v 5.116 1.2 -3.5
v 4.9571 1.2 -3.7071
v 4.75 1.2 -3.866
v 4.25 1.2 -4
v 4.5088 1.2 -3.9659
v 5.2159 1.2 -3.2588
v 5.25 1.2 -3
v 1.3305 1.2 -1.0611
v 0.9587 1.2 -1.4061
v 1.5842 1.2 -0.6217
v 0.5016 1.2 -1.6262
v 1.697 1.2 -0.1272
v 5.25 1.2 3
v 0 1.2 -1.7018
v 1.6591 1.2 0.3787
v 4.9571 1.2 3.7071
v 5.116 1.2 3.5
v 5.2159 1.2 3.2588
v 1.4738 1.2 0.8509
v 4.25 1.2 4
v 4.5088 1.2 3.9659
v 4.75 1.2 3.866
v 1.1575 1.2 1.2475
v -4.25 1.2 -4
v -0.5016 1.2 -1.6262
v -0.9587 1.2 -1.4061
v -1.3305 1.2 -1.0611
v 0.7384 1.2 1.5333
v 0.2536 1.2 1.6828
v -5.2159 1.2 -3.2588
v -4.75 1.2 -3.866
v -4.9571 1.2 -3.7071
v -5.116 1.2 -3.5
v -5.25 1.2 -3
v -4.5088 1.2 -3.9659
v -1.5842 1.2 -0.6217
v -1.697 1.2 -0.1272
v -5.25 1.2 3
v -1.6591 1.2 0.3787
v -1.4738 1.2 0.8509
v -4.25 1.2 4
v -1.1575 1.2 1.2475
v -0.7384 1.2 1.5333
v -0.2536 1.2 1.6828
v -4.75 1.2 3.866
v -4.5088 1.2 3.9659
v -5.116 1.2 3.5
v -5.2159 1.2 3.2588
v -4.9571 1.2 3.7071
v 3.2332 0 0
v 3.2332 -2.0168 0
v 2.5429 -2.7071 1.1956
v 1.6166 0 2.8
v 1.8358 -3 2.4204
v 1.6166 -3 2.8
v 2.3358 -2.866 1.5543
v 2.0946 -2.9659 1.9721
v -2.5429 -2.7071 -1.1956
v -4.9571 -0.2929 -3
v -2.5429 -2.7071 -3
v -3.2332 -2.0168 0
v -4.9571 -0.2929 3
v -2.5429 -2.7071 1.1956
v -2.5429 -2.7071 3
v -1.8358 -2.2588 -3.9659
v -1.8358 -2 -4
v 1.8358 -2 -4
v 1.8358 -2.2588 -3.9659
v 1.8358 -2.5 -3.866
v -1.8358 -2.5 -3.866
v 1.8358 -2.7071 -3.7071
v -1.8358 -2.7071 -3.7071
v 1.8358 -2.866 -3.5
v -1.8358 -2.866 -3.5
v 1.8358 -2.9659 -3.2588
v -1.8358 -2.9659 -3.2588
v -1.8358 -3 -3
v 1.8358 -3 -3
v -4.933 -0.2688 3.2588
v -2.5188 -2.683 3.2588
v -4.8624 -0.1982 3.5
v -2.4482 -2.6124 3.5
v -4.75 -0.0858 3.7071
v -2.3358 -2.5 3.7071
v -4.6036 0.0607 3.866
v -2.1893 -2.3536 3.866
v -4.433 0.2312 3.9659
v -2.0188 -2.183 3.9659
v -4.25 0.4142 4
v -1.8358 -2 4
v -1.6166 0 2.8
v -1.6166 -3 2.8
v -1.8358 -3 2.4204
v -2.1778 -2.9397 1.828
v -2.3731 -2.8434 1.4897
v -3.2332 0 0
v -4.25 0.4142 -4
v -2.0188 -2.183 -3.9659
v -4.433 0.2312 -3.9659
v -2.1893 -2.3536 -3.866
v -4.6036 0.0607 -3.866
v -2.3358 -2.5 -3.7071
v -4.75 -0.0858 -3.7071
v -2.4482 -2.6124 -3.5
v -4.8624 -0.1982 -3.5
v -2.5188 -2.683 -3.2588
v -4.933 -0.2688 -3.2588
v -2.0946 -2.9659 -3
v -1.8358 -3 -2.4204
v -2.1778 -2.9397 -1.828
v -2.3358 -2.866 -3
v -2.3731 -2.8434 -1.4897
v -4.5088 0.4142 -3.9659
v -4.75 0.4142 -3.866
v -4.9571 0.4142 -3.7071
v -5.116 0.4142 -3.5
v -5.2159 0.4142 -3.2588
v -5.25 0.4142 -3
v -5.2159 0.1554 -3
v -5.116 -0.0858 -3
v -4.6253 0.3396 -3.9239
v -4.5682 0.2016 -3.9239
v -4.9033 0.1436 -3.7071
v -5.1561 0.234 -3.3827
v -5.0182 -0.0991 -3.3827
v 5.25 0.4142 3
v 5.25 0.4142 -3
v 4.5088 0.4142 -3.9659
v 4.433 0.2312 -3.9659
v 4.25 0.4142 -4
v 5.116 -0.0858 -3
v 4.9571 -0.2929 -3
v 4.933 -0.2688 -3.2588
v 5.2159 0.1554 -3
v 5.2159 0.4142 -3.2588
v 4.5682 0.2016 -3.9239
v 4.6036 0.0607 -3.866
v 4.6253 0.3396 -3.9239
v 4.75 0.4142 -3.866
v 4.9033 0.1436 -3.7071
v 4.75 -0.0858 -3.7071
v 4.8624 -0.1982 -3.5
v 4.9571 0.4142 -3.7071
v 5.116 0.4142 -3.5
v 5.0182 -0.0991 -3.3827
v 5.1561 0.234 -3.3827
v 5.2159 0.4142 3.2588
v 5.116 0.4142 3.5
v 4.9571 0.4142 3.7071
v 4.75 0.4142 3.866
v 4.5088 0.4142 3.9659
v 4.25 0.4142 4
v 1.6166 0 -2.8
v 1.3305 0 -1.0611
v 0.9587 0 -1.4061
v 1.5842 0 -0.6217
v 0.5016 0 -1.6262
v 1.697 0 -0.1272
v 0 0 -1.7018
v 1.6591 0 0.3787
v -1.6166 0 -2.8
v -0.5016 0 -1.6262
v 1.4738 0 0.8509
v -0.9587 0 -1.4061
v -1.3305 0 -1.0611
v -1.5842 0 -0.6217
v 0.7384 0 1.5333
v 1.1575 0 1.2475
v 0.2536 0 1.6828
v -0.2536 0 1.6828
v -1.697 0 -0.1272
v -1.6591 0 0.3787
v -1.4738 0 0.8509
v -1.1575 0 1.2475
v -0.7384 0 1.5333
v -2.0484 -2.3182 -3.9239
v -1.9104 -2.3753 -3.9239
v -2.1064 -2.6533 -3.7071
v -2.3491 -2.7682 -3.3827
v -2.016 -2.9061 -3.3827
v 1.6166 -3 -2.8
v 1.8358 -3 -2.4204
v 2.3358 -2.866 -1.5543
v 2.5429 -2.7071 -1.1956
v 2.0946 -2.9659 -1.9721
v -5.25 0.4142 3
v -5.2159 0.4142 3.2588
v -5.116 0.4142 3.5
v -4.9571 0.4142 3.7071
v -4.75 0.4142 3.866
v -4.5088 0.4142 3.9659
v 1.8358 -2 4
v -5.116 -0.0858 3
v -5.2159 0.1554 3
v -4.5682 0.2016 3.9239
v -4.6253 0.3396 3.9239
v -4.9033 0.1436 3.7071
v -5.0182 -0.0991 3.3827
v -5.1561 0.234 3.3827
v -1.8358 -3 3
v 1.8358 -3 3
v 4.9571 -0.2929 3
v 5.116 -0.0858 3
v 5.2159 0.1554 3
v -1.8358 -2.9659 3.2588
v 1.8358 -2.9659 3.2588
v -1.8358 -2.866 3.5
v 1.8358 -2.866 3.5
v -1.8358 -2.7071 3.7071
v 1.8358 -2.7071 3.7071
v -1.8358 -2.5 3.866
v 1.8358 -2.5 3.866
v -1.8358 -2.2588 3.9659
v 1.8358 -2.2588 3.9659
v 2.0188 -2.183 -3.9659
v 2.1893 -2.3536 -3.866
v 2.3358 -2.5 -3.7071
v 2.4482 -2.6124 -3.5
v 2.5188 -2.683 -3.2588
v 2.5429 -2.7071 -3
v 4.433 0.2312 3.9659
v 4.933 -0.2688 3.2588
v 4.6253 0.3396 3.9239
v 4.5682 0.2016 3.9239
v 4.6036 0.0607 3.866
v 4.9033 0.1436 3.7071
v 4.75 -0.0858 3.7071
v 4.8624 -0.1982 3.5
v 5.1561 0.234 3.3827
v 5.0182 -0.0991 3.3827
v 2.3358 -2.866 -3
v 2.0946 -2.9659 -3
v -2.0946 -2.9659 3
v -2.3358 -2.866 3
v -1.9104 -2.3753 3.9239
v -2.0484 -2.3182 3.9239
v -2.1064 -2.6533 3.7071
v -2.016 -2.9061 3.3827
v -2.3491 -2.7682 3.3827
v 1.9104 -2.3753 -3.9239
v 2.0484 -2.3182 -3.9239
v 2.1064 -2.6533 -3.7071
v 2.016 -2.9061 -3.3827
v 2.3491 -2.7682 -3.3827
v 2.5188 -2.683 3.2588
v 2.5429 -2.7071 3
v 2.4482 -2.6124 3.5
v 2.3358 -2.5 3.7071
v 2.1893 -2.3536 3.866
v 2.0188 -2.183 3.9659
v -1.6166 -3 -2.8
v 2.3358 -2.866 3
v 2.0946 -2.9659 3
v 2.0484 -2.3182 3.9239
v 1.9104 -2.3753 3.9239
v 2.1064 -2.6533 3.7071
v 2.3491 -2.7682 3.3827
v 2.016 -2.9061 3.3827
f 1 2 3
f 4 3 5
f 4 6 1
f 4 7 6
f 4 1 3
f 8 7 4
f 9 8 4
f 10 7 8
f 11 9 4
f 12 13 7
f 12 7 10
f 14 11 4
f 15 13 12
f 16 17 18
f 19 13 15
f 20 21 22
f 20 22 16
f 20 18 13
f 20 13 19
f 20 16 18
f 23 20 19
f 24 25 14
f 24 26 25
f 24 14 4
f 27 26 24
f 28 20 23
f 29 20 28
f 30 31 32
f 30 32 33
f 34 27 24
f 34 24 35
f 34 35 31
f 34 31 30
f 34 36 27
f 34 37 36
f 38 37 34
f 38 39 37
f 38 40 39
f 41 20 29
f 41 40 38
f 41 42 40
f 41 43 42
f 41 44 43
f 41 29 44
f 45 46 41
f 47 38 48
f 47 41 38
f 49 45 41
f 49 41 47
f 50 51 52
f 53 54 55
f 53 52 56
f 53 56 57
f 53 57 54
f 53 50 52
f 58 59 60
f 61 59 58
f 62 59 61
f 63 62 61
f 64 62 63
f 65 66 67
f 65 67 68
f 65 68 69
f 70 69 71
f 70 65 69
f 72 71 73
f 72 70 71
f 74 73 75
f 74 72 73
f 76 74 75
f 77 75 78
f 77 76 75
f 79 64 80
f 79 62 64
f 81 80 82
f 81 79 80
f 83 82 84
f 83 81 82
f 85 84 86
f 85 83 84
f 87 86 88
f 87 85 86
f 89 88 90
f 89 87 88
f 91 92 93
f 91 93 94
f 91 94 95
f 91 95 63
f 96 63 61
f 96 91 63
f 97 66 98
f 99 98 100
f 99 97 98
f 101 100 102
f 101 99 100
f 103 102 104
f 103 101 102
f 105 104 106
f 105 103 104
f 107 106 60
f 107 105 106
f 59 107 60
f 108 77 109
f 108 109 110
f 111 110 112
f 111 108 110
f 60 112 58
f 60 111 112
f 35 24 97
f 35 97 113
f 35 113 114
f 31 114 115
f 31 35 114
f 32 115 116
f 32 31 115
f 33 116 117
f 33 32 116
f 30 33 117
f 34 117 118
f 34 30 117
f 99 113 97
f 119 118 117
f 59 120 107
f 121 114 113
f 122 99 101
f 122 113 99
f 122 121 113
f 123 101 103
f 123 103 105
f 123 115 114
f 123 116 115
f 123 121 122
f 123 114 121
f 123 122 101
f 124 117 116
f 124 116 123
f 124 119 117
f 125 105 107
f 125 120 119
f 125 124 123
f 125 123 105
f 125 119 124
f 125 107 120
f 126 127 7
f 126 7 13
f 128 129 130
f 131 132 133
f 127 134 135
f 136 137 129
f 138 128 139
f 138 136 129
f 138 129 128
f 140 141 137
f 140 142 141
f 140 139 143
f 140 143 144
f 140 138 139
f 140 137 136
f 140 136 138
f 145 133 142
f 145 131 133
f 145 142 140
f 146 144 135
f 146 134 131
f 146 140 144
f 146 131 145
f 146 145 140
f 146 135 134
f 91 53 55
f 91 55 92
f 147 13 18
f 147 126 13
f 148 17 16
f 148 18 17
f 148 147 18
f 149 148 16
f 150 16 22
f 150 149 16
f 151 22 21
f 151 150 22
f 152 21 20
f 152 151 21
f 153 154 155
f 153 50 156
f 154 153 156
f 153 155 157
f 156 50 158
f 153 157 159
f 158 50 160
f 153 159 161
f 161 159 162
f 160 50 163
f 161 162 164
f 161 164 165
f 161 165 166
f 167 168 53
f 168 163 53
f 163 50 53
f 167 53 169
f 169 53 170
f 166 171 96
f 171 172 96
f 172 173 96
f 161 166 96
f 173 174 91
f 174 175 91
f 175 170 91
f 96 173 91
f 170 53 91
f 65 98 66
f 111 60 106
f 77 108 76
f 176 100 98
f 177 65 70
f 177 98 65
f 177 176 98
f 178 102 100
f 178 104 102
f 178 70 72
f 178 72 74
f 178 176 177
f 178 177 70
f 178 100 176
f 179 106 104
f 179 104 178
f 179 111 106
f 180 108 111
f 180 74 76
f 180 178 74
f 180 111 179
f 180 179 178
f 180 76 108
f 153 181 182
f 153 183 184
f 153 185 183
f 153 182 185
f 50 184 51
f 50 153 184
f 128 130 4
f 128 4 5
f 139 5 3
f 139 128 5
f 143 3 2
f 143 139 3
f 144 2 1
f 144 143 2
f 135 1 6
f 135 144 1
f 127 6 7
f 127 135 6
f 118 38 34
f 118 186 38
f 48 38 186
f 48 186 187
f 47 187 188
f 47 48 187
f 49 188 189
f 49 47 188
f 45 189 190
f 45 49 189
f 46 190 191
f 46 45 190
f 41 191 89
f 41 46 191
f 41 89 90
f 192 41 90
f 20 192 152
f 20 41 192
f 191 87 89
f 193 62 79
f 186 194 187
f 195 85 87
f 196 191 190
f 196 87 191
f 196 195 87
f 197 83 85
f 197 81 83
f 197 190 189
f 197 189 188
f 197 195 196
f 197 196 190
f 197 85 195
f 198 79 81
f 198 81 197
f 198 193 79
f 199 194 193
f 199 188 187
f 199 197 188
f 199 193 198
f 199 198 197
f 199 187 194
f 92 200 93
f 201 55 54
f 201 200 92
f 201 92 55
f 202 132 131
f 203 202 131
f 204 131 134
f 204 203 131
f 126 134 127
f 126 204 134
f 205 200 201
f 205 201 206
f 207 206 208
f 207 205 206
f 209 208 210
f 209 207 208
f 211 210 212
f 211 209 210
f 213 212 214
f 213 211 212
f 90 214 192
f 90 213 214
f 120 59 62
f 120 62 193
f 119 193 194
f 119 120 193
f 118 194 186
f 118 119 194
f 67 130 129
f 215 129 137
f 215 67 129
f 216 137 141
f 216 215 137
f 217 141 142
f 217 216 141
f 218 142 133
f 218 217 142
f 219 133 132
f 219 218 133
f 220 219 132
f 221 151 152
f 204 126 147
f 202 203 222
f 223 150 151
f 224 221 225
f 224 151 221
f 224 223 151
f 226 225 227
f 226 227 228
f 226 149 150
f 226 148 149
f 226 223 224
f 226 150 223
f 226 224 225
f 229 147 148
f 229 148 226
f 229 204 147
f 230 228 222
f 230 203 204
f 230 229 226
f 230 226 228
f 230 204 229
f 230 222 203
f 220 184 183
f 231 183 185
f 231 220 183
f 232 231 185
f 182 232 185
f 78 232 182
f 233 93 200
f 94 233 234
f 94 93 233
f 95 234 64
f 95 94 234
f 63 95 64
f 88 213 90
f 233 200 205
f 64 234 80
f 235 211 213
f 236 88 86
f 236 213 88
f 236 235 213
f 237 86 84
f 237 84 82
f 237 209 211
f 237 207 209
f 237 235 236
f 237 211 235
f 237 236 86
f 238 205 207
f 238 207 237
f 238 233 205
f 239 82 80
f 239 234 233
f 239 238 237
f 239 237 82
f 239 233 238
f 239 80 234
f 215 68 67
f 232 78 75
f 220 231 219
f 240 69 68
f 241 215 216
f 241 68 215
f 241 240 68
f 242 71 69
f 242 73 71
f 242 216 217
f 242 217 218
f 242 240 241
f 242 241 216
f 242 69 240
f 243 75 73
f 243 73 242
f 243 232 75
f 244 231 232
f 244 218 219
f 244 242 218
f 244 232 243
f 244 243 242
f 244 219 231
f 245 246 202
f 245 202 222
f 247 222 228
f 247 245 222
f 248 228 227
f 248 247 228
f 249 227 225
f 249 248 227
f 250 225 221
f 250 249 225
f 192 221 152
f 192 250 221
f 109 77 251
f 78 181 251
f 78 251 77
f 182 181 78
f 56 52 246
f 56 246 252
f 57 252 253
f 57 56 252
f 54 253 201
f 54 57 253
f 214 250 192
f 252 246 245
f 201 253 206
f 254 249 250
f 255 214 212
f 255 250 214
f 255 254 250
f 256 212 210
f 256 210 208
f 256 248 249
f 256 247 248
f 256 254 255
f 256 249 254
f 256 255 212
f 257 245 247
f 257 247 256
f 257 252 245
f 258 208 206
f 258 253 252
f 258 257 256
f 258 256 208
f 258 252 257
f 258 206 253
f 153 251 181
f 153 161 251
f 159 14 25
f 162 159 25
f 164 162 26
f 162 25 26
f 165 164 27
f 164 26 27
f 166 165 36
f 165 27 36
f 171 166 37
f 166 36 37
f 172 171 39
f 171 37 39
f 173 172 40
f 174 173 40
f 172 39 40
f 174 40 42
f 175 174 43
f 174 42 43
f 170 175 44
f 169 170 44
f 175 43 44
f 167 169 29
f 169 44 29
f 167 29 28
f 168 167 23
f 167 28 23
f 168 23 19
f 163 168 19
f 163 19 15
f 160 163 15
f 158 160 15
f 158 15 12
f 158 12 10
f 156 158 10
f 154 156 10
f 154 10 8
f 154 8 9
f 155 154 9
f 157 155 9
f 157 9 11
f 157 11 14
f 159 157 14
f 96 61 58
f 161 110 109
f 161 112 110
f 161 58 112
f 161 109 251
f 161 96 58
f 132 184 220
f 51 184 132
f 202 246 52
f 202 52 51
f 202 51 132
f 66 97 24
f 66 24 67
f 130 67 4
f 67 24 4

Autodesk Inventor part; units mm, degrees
ref_plane "YZ Plane" through (0, 0, 0) normal (1, 0, 0) x (0, 1, 0)
ref_plane "XZ Plane" through (0, 0, 0) normal (0, 1, 0) x (-1, 0, 0)
ref_plane "XY Plane" through (0, 0, 0) normal (0, 0, 1) x (1, 0, 0)
sketch "Sketch1" plane through (0, 0, 0) normal (0, 1, 0) x (-1, 0, 0)
  line L0 (1.6166, 2.8) -> (3.2332, 0)
  line L1 (3.2332, 0) -> (1.6166, -2.8)
  line L2 (1.6166, -2.8) -> (-1.6166, -2.8)
  line L3 (-1.6166, -2.8) -> (-3.2332, 0)
  line L4 (-3.2332, 0) -> (-1.6166, 2.8)
  line L5 (-1.6166, 2.8) -> (1.6166, 2.8)
  line L6 (5.25, -4) -> (-5.25, -4)
  line L7 (-5.25, -4) -> (-5.25, 4)
  line L8 (-5.25, 4) -> (5.25, 4)
  line L9 (5.25, 4) -> (5.25, -4)
  line L10 (5.25, -4) -> (-5.25, 4) construction
  line L11 (-5.25, -4) -> (5.25, 4) construction
  point P0 (0, 0)
  point P1 (0, 0)
  point P2 (0, 0)
  dimension "d1" = 5.6
  dimension "d2" = 10.5
  dimension "d3" = 8
extrude "Extrusion1" add sketch "Sketch1" along normal blind 1.2 contours L0 L1 L2 L3 L4 L5 | L6 L7 L8 L9
sketch "Sketch2" plane through (-5.25, 0, 4) normal (0, 0, 1) x (1, 0, 0)
  line L0 (0, 0) -> (10.5, 0) projected
  line L1 (0, 0) -> (3, -3)
  line L2 (3, -3) -> (7.5, -3)
  line L3 (7.5, -3) -> (10.5, 0)
  point P0 (5.25, -3)
  point P1 (5.25, 0)
  dimension "d6" = 45
  dimension "d7" = 3
extrude "Extrusion2" add sketch "Sketch2" against normal up to surface (8 mm away)
extrude "Extrusion3" cut sketch "Sketch1" against normal up to surface (3 mm away) contours L0 L1 L2 L3 L4 L5
fillet "Fillet1" radius 1 6 edges at (5.25, 0, 0) (-5.25, 0, 0) (-2.25, -3, 2.8514) (2.25, -3, 2.8514) (2.25, -3, -2.8514) (-2.25, -3, -2.8514)
fillet "Fillet2" radius 1 18 edges at (2.2185, -2.9239, 4) (3.75, -1.5, 4) (5.1739, 0.0315, 4) (5.25, 0.8071, 4) (-2.2185, -2.9239, 4) (-3.75, -1.5, 4) (-5.1739, 0.0315, 4) (-5.25, 0.8071, 4) (0, -3, 4) (2.2185, -2.9239, -4) (3.75, -1.5, -4) (5.1739, 0.0315, -4) (5.25, 0.8071, -4) (-2.2185, -2.9239, -4) (-3.75, -1.5, -4) (-5.1739, 0.0315, -4) (-5.25, 0.8071, -4) (0, -3, -4)
hole "Hole1" at (0, 0, 0) direction (0, 1, 0) diameter 3.4036 end through all clearance for "Socket Head Cap Screw" size "M3" standard "Ansi Metric M Profile"
properties part number "T Nut Adapter"
